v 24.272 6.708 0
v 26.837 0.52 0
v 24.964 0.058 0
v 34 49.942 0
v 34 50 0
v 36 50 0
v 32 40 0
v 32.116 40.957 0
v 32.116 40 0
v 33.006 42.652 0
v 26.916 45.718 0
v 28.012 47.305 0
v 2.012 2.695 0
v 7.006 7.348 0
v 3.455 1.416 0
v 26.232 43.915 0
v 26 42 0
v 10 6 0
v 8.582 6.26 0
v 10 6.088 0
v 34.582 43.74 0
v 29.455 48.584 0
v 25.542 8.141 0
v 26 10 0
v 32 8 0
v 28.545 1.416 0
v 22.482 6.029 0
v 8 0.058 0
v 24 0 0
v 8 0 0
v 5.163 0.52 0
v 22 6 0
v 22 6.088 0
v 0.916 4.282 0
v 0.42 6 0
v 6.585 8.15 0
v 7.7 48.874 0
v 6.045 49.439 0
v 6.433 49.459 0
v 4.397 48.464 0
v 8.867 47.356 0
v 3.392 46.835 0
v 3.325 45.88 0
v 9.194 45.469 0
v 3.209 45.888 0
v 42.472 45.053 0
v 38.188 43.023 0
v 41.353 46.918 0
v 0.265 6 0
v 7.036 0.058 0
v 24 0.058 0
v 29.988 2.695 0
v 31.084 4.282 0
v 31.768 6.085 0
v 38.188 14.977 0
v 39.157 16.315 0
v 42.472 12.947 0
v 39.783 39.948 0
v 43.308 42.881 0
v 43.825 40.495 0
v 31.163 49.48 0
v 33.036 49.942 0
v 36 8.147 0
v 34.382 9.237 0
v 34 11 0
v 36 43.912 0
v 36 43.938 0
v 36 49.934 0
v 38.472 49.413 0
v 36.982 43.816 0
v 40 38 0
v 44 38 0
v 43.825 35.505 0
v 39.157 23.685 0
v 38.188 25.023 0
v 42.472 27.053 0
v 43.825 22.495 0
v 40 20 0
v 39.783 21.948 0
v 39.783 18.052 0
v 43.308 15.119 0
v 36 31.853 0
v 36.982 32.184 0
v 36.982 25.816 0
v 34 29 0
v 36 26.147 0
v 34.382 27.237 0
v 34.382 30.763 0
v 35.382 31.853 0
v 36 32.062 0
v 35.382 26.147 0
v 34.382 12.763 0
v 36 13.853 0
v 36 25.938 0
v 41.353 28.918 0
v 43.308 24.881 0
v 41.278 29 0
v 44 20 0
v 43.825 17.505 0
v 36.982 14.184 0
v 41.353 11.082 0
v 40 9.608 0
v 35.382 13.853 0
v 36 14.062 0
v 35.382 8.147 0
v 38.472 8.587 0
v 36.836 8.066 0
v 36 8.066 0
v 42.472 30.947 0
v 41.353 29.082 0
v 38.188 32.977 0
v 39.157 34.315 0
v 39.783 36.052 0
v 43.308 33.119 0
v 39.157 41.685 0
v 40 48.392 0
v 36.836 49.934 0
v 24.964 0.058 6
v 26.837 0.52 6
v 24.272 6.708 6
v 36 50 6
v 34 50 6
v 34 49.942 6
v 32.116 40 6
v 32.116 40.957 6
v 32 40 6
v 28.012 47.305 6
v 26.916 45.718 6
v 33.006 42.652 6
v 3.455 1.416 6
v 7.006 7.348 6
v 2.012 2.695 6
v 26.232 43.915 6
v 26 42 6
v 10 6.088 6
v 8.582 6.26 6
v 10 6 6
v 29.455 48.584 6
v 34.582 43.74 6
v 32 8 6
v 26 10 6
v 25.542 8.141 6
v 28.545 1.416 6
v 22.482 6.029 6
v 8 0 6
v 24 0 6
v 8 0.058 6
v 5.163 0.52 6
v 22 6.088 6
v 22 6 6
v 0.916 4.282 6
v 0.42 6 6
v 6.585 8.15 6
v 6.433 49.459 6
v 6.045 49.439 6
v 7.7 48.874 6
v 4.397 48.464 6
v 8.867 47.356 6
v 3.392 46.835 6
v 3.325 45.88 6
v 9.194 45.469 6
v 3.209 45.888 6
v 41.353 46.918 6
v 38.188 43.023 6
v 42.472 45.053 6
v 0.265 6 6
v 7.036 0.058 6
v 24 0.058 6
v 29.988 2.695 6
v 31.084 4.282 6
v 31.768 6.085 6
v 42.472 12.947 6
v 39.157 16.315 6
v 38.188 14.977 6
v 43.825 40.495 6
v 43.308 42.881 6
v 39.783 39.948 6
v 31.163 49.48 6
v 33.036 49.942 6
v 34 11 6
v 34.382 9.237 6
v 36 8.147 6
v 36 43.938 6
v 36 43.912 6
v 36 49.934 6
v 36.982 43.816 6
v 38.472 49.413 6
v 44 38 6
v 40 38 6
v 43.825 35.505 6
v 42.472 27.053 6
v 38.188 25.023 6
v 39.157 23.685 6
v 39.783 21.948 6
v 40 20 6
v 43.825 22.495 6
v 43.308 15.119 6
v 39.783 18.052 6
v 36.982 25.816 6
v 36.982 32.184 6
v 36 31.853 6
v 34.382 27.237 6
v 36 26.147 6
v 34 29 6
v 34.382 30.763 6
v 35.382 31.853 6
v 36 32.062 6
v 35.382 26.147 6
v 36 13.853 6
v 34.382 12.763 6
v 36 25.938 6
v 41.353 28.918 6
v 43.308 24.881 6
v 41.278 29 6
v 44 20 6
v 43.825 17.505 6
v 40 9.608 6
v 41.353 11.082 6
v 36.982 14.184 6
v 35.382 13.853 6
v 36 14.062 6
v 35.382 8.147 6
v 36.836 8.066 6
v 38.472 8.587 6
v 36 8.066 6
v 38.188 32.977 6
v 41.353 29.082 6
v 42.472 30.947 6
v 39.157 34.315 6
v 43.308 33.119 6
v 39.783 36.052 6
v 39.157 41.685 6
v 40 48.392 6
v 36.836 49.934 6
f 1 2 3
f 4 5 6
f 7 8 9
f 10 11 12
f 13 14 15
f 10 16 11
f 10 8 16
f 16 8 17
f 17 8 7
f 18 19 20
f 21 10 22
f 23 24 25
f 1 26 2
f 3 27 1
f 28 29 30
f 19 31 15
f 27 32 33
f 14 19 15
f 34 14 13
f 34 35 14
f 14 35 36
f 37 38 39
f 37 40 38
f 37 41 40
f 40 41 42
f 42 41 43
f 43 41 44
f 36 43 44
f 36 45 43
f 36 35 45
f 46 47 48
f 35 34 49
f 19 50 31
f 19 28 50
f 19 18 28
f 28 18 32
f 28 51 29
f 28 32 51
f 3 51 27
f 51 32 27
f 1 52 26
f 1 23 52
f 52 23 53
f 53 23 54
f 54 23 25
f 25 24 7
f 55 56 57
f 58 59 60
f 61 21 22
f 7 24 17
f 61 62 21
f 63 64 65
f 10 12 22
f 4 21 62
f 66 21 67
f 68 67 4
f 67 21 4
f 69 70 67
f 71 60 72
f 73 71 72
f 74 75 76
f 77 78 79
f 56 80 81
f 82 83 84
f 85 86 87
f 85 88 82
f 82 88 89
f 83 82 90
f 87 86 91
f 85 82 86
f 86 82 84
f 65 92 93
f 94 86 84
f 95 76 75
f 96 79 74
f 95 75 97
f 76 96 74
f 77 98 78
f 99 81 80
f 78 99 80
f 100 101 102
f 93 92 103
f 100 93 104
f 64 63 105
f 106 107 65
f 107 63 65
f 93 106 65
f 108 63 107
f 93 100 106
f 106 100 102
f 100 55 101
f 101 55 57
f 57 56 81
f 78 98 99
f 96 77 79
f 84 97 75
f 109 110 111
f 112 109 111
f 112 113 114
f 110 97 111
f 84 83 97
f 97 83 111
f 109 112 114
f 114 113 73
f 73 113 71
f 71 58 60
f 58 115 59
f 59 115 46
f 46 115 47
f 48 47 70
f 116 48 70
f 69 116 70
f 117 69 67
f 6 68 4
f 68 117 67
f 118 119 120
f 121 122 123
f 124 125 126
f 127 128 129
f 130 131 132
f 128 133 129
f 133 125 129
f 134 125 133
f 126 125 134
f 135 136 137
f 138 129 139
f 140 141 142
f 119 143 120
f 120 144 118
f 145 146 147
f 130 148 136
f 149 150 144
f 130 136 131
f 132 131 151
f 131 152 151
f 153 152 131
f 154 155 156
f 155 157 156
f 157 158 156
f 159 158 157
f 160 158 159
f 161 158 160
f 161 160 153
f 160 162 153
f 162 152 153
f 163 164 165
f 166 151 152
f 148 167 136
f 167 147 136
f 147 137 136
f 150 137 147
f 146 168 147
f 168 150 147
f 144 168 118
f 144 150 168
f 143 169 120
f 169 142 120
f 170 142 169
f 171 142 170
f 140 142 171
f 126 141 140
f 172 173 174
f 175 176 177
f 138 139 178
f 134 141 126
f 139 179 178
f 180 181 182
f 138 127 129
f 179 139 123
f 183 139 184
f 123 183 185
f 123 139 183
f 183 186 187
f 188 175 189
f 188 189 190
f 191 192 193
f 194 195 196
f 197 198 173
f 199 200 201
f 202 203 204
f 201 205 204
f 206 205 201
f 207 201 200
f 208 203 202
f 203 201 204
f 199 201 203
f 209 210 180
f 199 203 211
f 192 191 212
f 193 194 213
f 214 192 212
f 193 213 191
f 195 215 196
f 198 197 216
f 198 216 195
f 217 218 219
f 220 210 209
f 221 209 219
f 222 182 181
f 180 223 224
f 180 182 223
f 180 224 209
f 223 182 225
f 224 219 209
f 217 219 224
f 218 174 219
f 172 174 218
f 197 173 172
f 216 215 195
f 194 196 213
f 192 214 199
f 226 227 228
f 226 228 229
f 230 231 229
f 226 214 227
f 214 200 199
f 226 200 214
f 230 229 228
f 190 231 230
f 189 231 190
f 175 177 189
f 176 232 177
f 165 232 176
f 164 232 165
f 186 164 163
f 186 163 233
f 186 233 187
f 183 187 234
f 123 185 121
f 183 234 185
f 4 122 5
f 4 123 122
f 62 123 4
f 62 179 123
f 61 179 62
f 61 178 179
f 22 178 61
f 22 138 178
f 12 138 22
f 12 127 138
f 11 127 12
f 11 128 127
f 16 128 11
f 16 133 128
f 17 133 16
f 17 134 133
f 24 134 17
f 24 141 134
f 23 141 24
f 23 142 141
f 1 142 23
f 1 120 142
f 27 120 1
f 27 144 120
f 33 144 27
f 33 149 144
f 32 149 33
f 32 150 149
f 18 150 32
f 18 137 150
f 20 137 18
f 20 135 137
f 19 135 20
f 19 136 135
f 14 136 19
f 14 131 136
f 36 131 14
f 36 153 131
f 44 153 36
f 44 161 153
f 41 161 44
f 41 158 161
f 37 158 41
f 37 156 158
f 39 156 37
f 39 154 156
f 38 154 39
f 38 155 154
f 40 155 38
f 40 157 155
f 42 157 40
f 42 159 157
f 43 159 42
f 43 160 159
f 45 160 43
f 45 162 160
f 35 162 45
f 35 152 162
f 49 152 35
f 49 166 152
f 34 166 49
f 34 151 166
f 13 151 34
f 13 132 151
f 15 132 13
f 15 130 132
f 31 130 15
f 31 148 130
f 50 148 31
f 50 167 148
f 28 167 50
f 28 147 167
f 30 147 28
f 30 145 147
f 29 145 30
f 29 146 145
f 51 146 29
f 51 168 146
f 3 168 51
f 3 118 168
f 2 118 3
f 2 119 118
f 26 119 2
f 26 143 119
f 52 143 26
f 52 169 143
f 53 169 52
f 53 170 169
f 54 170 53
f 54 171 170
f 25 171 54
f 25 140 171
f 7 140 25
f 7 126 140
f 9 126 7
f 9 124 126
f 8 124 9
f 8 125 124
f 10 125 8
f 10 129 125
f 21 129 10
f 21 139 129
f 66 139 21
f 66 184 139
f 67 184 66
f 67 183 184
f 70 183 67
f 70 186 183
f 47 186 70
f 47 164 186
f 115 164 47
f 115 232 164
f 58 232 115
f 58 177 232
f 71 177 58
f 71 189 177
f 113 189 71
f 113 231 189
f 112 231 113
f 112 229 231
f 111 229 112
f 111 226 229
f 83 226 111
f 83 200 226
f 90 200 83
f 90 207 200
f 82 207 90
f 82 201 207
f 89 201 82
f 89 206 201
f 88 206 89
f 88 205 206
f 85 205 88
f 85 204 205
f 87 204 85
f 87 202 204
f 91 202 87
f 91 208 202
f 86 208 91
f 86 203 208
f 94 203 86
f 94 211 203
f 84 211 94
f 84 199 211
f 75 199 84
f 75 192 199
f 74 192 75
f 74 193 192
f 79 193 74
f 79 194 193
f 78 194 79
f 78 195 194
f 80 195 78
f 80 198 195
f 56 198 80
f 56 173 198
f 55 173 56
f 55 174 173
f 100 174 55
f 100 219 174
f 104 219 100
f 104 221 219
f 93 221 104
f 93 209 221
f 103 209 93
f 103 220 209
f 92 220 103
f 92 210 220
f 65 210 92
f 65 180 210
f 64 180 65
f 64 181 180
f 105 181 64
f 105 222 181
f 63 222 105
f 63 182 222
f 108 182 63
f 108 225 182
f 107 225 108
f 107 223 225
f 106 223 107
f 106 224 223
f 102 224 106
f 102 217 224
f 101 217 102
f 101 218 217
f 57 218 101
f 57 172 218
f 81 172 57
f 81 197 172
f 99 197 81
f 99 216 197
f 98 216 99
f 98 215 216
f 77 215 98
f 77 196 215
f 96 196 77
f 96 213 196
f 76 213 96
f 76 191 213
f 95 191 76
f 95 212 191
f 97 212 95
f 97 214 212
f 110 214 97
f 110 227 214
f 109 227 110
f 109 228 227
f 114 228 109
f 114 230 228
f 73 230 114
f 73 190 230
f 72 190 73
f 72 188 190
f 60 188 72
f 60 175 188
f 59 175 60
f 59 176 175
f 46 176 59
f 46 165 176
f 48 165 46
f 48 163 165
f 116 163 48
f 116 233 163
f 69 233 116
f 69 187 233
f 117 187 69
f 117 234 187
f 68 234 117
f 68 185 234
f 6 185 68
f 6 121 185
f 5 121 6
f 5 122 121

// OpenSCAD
/* [Basic] */
//The number of wires the bracket will hold
numWires = 2;           // [1:6]
//the thickness of the table (for a tight fit, make it a mm smaller)
tableThickness = 20;    // [1:100]
// the size of the gap provided for the wires
wireSize = 6;                  // [2:8]
// How far the bracket extends under and over the table
bracketDepth = 50;      // [20:100]
//the clearance for the wire to be put into the bracket.  This should be a bit less than the wire thickness so you can snap it in
wireClearanceVal = 2;   // [1:10]
//the thickness of the bracket.  increase for more durability.
bracketThickness = 6;   // [1:15]

/* [Advanced] */
//increase this to flatten the wire clip portion
scaleFactor = 1.5; //[1:.1:5]
//change the severity of the fillets
roundFactor = 1; //[0:.1:1.5]
//edit the angle of the clamp.  the angle helps to increate tension of the clamp.  higher values 
clampAngle = 4; //[0:.1:8]
//change to a non-zero value to customize the amount of extrusion.  If 0, the thickness is used.
customExtrusion = 0 ;//[0:20]

/* [Hidden] */ 
gap = tableThickness + bracketThickness;
wireClearance = wireClearanceVal + bracketThickness/2/scaleFactor;
r = wireSize;
linear_extrude(customExtrusion?customExtrusion:bracketThickness)
{
// Notify if build_vector will be used instead of input variables count, clip_diameter, and buffer!
difference()
    {
union(){
    //create table bracket
    rotate (-clampAngle) square([bracketThickness, bracketDepth], false);
    
    square([gap + bracketThickness, bracketThickness], false);
    translate ([gap, 0]) square([bracketThickness, bracketDepth], false);
    //connect bracket to wire loops
    translate ([gap + bracketThickness, bracketDepth - bracketThickness]) square([wireClearance, bracketThickness], false);
    
    //add inside corner rounds
    translate([bracketThickness,bracketThickness]) roundIn(4);
    translate([gap,bracketThickness]) roundIn(4);
    translate([gap,bracketThickness]) roundIn(4);
    translate([gap+bracketThickness, bracketDepth - bracketThickness]) roundIn(4);
}
 roundIn(8);
//create outside corner rounds
translate([gap+bracketThickness,0]) roundIn(8);
translate([gap,bracketDepth]) roundIn(8);
rotate (-clampAngle) translate([0,bracketDepth]) roundIn(4);
rotate (-clampAngle) translate([bracketThickness,bracketDepth]) roundIn(4);

//cleanup hack
translate([0,-1000])square(1000);
translate([-1000,0])square(1000);
translate([-1000,-1000])square(1000);
}

//create the wire clip loops
for (i = [ 0 : 1 : numWires-1 ])
{
    yOffset = -i*(r * 2 + bracketThickness);

    union()
    {
    translate ([gap + bracketThickness+wireClearance,bracketDepth-2*r-1.5*bracketThickness + yOffset ]) scale([1/scaleFactor,1.0]) circle (bracketThickness/2);
    difference() {
        
        translate ([gap + bracketThickness+wireClearance,bracketDepth-r-bracketThickness + yOffset]) scale([1/scaleFactor,1.0]) circle (r+bracketThickness);
        translate ([wireClearance,yOffset])square([gap + bracketThickness, bracketDepth], false);
        translate ([gap + bracketThickness + wireClearance,bracketDepth-r-bracketThickness + yOffset]) scale([1/scaleFactor,1.0]) circle (r);
        }   
    }
}
}

module roundIn(r)
{
    radius = r * roundFactor;  
    difference() {

            translate([-radius, -radius]) square([radius*2, radius*2]);
            translate([radius, radius])circle(r=radius);
            translate([-radius, radius])circle(r=radius);
            translate([radius, -radius])circle(r=radius);
            translate([-radius, -radius])circle(r=radius);
        }
}
